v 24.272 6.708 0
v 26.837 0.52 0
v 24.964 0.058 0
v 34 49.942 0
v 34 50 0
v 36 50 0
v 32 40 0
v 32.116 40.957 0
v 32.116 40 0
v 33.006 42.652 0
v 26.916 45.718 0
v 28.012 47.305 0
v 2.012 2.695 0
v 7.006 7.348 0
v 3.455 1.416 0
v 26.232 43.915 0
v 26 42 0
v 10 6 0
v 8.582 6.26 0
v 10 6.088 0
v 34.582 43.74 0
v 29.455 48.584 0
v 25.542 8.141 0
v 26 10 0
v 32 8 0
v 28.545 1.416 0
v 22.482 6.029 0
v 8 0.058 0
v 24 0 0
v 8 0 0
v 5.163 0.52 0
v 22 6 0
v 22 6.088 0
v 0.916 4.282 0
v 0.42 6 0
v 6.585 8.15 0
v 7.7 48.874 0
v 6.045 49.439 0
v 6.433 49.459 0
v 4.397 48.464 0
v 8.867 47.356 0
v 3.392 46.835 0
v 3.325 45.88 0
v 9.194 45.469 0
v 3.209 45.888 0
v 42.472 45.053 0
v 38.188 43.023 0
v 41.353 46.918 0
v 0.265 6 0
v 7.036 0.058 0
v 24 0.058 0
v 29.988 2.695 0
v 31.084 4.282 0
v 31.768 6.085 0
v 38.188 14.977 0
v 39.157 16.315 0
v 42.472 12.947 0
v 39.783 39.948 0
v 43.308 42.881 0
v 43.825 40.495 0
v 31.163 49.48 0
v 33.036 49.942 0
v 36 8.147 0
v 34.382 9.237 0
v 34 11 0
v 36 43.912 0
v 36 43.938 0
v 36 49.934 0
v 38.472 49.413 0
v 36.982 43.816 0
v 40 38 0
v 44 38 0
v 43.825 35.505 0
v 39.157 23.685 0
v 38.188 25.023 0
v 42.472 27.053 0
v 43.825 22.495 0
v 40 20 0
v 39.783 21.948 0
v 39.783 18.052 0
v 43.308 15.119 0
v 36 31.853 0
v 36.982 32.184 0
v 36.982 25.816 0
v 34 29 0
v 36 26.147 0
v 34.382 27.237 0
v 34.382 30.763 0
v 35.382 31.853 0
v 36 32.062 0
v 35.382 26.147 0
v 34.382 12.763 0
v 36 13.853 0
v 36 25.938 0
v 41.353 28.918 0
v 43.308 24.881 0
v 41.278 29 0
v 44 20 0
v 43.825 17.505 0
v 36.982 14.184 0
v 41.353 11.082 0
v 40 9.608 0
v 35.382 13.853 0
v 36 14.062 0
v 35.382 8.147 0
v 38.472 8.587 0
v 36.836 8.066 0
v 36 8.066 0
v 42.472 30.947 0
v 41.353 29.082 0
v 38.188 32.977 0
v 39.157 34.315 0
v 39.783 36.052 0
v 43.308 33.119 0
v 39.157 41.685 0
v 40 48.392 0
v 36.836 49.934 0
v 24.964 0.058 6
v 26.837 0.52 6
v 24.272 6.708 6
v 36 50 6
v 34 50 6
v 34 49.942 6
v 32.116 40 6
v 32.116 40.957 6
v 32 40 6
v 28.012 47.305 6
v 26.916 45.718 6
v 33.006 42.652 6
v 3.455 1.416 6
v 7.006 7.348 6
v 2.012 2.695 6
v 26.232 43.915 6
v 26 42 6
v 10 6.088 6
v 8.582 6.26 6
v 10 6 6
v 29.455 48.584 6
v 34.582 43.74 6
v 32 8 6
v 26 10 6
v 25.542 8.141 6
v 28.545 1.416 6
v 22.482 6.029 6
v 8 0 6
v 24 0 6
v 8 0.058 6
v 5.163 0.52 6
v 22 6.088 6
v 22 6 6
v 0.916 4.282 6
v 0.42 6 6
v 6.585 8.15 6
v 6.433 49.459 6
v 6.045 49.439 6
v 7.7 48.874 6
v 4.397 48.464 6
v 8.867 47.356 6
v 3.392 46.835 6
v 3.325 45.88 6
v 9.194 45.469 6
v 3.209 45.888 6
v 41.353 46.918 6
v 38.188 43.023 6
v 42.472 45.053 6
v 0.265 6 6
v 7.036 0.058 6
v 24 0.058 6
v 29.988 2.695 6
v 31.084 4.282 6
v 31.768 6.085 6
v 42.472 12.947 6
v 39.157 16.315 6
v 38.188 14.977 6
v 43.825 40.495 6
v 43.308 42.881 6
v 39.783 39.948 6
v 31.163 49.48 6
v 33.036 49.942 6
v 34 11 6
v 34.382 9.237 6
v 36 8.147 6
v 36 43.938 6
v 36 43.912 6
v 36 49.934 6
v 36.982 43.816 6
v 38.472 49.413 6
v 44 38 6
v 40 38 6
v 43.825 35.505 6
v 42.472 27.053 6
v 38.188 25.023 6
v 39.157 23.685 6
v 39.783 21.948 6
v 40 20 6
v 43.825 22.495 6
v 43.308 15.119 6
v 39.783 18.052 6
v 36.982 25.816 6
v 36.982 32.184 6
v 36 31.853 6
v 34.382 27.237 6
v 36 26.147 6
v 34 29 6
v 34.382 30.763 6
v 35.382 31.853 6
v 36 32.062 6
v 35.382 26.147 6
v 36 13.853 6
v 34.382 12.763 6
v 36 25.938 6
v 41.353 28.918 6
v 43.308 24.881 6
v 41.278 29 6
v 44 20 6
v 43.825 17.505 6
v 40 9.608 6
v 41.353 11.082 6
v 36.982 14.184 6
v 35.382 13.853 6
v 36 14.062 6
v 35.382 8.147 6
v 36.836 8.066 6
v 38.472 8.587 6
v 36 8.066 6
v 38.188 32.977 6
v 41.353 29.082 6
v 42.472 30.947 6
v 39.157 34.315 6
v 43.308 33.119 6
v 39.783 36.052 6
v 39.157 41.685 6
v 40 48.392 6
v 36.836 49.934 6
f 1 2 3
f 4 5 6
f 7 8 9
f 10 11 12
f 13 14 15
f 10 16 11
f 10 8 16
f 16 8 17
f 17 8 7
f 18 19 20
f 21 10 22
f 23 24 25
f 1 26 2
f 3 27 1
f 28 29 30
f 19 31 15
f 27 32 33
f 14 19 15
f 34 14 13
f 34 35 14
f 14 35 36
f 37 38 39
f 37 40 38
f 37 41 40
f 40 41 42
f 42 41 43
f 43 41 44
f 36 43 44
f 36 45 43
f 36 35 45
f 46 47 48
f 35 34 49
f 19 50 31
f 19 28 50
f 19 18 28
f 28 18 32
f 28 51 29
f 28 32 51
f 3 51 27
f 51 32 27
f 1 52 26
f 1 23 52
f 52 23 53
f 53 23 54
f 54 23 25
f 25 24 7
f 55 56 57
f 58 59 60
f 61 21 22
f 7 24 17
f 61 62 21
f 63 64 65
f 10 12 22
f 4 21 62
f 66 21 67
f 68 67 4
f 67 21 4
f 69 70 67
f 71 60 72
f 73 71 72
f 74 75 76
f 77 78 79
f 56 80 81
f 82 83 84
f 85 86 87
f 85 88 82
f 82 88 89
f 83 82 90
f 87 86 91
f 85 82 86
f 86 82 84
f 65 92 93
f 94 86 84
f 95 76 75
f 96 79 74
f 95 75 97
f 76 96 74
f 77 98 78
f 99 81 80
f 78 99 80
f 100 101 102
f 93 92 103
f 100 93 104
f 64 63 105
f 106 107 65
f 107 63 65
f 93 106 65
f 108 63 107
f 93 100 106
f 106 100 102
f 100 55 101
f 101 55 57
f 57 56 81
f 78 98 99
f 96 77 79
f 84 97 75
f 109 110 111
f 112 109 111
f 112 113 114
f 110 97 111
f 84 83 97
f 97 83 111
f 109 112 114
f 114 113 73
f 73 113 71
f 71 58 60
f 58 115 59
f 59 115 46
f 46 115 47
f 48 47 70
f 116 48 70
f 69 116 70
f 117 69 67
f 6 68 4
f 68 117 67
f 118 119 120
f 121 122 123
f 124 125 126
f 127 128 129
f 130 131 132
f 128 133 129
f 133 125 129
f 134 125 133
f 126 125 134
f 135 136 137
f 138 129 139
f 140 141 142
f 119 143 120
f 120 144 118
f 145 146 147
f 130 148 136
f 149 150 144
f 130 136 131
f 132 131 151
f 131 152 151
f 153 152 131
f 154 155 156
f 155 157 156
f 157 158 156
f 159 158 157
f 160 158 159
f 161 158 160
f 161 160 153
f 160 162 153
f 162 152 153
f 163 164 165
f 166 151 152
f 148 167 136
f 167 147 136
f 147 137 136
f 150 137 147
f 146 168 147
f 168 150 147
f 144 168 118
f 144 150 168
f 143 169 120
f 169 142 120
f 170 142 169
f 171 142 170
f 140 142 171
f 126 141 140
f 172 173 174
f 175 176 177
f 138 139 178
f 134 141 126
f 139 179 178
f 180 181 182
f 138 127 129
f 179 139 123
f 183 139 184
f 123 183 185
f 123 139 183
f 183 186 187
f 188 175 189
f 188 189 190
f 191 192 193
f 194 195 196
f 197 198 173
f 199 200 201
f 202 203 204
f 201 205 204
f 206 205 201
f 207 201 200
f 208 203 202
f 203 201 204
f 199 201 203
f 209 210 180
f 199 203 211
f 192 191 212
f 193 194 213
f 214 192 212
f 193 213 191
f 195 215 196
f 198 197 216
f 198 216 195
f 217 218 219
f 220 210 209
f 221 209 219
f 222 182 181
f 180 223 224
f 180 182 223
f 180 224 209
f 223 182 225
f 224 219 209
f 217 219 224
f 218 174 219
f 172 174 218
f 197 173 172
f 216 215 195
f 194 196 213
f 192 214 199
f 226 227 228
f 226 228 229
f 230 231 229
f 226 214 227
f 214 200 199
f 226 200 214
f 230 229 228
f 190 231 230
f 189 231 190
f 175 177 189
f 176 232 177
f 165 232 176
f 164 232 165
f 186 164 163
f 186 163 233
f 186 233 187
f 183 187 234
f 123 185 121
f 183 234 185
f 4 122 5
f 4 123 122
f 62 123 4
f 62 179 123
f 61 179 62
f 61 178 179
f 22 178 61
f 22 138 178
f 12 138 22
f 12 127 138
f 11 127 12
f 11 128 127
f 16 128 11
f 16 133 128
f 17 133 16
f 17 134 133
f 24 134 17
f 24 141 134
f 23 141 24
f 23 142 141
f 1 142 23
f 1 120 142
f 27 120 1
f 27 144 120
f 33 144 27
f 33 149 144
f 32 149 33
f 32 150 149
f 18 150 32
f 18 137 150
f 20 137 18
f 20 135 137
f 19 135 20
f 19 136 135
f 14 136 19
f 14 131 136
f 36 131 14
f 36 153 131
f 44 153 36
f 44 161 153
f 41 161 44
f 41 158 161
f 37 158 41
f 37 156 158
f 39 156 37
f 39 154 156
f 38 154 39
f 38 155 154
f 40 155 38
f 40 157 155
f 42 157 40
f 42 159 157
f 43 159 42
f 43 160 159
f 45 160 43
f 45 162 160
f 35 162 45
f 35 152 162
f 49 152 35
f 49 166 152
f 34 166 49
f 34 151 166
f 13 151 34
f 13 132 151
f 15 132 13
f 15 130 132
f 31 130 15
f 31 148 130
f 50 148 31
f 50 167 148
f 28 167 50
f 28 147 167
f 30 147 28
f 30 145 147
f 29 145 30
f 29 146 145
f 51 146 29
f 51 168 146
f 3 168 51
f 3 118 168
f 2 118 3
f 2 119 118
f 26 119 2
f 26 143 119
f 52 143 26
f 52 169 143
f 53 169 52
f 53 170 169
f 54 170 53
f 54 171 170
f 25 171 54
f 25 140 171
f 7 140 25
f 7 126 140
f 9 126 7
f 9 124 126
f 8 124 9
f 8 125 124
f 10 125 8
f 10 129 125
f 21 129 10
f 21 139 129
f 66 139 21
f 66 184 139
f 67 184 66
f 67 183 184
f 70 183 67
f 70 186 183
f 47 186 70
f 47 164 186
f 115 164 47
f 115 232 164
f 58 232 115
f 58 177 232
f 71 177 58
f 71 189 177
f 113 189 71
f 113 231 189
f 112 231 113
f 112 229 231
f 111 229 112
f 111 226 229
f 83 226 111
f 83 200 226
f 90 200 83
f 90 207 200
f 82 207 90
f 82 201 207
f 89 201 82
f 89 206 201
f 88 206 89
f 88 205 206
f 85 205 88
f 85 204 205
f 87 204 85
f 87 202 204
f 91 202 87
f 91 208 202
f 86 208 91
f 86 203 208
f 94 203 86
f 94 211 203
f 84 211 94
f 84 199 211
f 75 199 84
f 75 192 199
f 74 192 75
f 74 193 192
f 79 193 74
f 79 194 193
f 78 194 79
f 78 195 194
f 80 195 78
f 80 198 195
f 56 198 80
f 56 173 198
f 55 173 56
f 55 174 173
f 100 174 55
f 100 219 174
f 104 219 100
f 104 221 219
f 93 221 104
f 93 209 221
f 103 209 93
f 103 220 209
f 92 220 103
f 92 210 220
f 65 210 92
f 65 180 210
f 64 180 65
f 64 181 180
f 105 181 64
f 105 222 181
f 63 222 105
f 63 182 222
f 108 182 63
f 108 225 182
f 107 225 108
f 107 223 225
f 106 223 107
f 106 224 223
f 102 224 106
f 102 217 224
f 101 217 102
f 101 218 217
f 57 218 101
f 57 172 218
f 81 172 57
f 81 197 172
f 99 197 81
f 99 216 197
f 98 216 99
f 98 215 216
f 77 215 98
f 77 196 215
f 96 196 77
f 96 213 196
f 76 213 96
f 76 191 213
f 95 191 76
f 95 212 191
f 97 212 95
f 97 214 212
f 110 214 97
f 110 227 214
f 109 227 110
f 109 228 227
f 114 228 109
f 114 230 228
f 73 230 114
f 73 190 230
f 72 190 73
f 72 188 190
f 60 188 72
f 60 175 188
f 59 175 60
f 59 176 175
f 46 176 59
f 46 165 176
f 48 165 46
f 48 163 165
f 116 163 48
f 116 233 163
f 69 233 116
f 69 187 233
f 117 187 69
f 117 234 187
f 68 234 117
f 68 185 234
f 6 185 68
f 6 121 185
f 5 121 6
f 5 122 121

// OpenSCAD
/* [Basic] */
//The number of wires the bracket will hold
numWires = 2;           // [1:6]
//the thickness of the table (for a tight fit, make it a mm smaller)
tableThickness = 20;    // [1:100]
// the size of the gap provided for the wires
wireSize = 6;                  // [2:8]
// How far the bracket extends under and over the table
bracketDepth = 50;      // [20:100]
//the clearance for the wire to be put into the bracket.  This should be a bit less than the wire thickness so you can snap it in
wireClearanceVal = 2;   // [1:10]
//the thickness of the bracket.  increase for more durability.
bracketThickness = 6;   // [1:15]

/* [Advanced] */
//increase this to flatten the wire clip portion
scaleFactor = 1.5; //[1:.1:5]
//change the severity of the fillets
roundFactor = 1; //[0:.1:1.5]
//edit the angle of the clamp.  the angle helps to increate tension of the clamp.  higher values 
clampAngle = 4; //[0:.1:8]
//change to a non-zero value to customize the amount of extrusion.  If 0, the thickness is used.
customExtrusion = 0 ;//[0:20]

/* [Hidden] */ 
gap = tableThickness + bracketThickness;
wireClearance = wireClearanceVal + bracketThickness/2/scaleFactor;
r = wireSize;
linear_extrude(customExtrusion?customExtrusion:bracketThickness)
{
// Notify if build_vector will be used instead of input variables count, clip_diameter, and buffer!
difference()
    {
union(){
    //create table bracket
    rotate (-clampAngle) square([bracketThickness, bracketDepth], false);
    
    square([gap + bracketThickness, bracketThickness], false);
    translate ([gap, 0]) square([bracketThickness, bracketDepth], false);
    //connect bracket to wire loops
    translate ([gap + bracketThickness, bracketDepth - bracketThickness]) square([wireClearance, bracketThickness], false);
    
    //add inside corner rounds
    translate([bracketThickness,bracketThickness]) roundIn(4);
    translate([gap,bracketThickness]) roundIn(4);
    translate([gap,bracketThickness]) roundIn(4);
    translate([gap+bracketThickness, bracketDepth - bracketThickness]) roundIn(4);
}
 roundIn(8);
//create outside corner rounds
translate([gap+bracketThickness,0]) roundIn(8);
translate([gap,bracketDepth]) roundIn(8);
rotate (-clampAngle) translate([0,bracketDepth]) roundIn(4);
rotate (-clampAngle) translate([bracketThickness,bracketDepth]) roundIn(4);

//cleanup hack
translate([0,-1000])square(1000);
translate([-1000,0])square(1000);
translate([-1000,-1000])square(1000);
}

//create the wire clip loops
for (i = [ 0 : 1 : numWires-1 ])
{
    yOffset = -i*(r * 2 + bracketThickness);

    union()
    {
    translate ([gap + bracketThickness+wireClearance,bracketDepth-2*r-1.5*bracketThickness + yOffset ]) scale([1/scaleFactor,1.0]) circle (bracketThickness/2);
    difference() {
        
        translate ([gap + bracketThickness+wireClearance,bracketDepth-r-bracketThickness + yOffset]) scale([1/scaleFactor,1.0]) circle (r+bracketThickness);
        translate ([wireClearance,yOffset])square([gap + bracketThickness, bracketDepth], false);
        translate ([gap + bracketThickness + wireClearance,bracketDepth-r-bracketThickness + yOffset]) scale([1/scaleFactor,1.0]) circle (r);
        }   
    }
}
}

module roundIn(r)
{
    radius = r * roundFactor;  
    difference() {

            translate([-radius, -radius]) square([radius*2, radius*2]);
            translate([radius, radius])circle(r=radius);
            translate([-radius, radius])circle(r=radius);
            translate([radius, -radius])circle(r=radius);
            translate([-radius, -radius])circle(r=radius);
        }
}
